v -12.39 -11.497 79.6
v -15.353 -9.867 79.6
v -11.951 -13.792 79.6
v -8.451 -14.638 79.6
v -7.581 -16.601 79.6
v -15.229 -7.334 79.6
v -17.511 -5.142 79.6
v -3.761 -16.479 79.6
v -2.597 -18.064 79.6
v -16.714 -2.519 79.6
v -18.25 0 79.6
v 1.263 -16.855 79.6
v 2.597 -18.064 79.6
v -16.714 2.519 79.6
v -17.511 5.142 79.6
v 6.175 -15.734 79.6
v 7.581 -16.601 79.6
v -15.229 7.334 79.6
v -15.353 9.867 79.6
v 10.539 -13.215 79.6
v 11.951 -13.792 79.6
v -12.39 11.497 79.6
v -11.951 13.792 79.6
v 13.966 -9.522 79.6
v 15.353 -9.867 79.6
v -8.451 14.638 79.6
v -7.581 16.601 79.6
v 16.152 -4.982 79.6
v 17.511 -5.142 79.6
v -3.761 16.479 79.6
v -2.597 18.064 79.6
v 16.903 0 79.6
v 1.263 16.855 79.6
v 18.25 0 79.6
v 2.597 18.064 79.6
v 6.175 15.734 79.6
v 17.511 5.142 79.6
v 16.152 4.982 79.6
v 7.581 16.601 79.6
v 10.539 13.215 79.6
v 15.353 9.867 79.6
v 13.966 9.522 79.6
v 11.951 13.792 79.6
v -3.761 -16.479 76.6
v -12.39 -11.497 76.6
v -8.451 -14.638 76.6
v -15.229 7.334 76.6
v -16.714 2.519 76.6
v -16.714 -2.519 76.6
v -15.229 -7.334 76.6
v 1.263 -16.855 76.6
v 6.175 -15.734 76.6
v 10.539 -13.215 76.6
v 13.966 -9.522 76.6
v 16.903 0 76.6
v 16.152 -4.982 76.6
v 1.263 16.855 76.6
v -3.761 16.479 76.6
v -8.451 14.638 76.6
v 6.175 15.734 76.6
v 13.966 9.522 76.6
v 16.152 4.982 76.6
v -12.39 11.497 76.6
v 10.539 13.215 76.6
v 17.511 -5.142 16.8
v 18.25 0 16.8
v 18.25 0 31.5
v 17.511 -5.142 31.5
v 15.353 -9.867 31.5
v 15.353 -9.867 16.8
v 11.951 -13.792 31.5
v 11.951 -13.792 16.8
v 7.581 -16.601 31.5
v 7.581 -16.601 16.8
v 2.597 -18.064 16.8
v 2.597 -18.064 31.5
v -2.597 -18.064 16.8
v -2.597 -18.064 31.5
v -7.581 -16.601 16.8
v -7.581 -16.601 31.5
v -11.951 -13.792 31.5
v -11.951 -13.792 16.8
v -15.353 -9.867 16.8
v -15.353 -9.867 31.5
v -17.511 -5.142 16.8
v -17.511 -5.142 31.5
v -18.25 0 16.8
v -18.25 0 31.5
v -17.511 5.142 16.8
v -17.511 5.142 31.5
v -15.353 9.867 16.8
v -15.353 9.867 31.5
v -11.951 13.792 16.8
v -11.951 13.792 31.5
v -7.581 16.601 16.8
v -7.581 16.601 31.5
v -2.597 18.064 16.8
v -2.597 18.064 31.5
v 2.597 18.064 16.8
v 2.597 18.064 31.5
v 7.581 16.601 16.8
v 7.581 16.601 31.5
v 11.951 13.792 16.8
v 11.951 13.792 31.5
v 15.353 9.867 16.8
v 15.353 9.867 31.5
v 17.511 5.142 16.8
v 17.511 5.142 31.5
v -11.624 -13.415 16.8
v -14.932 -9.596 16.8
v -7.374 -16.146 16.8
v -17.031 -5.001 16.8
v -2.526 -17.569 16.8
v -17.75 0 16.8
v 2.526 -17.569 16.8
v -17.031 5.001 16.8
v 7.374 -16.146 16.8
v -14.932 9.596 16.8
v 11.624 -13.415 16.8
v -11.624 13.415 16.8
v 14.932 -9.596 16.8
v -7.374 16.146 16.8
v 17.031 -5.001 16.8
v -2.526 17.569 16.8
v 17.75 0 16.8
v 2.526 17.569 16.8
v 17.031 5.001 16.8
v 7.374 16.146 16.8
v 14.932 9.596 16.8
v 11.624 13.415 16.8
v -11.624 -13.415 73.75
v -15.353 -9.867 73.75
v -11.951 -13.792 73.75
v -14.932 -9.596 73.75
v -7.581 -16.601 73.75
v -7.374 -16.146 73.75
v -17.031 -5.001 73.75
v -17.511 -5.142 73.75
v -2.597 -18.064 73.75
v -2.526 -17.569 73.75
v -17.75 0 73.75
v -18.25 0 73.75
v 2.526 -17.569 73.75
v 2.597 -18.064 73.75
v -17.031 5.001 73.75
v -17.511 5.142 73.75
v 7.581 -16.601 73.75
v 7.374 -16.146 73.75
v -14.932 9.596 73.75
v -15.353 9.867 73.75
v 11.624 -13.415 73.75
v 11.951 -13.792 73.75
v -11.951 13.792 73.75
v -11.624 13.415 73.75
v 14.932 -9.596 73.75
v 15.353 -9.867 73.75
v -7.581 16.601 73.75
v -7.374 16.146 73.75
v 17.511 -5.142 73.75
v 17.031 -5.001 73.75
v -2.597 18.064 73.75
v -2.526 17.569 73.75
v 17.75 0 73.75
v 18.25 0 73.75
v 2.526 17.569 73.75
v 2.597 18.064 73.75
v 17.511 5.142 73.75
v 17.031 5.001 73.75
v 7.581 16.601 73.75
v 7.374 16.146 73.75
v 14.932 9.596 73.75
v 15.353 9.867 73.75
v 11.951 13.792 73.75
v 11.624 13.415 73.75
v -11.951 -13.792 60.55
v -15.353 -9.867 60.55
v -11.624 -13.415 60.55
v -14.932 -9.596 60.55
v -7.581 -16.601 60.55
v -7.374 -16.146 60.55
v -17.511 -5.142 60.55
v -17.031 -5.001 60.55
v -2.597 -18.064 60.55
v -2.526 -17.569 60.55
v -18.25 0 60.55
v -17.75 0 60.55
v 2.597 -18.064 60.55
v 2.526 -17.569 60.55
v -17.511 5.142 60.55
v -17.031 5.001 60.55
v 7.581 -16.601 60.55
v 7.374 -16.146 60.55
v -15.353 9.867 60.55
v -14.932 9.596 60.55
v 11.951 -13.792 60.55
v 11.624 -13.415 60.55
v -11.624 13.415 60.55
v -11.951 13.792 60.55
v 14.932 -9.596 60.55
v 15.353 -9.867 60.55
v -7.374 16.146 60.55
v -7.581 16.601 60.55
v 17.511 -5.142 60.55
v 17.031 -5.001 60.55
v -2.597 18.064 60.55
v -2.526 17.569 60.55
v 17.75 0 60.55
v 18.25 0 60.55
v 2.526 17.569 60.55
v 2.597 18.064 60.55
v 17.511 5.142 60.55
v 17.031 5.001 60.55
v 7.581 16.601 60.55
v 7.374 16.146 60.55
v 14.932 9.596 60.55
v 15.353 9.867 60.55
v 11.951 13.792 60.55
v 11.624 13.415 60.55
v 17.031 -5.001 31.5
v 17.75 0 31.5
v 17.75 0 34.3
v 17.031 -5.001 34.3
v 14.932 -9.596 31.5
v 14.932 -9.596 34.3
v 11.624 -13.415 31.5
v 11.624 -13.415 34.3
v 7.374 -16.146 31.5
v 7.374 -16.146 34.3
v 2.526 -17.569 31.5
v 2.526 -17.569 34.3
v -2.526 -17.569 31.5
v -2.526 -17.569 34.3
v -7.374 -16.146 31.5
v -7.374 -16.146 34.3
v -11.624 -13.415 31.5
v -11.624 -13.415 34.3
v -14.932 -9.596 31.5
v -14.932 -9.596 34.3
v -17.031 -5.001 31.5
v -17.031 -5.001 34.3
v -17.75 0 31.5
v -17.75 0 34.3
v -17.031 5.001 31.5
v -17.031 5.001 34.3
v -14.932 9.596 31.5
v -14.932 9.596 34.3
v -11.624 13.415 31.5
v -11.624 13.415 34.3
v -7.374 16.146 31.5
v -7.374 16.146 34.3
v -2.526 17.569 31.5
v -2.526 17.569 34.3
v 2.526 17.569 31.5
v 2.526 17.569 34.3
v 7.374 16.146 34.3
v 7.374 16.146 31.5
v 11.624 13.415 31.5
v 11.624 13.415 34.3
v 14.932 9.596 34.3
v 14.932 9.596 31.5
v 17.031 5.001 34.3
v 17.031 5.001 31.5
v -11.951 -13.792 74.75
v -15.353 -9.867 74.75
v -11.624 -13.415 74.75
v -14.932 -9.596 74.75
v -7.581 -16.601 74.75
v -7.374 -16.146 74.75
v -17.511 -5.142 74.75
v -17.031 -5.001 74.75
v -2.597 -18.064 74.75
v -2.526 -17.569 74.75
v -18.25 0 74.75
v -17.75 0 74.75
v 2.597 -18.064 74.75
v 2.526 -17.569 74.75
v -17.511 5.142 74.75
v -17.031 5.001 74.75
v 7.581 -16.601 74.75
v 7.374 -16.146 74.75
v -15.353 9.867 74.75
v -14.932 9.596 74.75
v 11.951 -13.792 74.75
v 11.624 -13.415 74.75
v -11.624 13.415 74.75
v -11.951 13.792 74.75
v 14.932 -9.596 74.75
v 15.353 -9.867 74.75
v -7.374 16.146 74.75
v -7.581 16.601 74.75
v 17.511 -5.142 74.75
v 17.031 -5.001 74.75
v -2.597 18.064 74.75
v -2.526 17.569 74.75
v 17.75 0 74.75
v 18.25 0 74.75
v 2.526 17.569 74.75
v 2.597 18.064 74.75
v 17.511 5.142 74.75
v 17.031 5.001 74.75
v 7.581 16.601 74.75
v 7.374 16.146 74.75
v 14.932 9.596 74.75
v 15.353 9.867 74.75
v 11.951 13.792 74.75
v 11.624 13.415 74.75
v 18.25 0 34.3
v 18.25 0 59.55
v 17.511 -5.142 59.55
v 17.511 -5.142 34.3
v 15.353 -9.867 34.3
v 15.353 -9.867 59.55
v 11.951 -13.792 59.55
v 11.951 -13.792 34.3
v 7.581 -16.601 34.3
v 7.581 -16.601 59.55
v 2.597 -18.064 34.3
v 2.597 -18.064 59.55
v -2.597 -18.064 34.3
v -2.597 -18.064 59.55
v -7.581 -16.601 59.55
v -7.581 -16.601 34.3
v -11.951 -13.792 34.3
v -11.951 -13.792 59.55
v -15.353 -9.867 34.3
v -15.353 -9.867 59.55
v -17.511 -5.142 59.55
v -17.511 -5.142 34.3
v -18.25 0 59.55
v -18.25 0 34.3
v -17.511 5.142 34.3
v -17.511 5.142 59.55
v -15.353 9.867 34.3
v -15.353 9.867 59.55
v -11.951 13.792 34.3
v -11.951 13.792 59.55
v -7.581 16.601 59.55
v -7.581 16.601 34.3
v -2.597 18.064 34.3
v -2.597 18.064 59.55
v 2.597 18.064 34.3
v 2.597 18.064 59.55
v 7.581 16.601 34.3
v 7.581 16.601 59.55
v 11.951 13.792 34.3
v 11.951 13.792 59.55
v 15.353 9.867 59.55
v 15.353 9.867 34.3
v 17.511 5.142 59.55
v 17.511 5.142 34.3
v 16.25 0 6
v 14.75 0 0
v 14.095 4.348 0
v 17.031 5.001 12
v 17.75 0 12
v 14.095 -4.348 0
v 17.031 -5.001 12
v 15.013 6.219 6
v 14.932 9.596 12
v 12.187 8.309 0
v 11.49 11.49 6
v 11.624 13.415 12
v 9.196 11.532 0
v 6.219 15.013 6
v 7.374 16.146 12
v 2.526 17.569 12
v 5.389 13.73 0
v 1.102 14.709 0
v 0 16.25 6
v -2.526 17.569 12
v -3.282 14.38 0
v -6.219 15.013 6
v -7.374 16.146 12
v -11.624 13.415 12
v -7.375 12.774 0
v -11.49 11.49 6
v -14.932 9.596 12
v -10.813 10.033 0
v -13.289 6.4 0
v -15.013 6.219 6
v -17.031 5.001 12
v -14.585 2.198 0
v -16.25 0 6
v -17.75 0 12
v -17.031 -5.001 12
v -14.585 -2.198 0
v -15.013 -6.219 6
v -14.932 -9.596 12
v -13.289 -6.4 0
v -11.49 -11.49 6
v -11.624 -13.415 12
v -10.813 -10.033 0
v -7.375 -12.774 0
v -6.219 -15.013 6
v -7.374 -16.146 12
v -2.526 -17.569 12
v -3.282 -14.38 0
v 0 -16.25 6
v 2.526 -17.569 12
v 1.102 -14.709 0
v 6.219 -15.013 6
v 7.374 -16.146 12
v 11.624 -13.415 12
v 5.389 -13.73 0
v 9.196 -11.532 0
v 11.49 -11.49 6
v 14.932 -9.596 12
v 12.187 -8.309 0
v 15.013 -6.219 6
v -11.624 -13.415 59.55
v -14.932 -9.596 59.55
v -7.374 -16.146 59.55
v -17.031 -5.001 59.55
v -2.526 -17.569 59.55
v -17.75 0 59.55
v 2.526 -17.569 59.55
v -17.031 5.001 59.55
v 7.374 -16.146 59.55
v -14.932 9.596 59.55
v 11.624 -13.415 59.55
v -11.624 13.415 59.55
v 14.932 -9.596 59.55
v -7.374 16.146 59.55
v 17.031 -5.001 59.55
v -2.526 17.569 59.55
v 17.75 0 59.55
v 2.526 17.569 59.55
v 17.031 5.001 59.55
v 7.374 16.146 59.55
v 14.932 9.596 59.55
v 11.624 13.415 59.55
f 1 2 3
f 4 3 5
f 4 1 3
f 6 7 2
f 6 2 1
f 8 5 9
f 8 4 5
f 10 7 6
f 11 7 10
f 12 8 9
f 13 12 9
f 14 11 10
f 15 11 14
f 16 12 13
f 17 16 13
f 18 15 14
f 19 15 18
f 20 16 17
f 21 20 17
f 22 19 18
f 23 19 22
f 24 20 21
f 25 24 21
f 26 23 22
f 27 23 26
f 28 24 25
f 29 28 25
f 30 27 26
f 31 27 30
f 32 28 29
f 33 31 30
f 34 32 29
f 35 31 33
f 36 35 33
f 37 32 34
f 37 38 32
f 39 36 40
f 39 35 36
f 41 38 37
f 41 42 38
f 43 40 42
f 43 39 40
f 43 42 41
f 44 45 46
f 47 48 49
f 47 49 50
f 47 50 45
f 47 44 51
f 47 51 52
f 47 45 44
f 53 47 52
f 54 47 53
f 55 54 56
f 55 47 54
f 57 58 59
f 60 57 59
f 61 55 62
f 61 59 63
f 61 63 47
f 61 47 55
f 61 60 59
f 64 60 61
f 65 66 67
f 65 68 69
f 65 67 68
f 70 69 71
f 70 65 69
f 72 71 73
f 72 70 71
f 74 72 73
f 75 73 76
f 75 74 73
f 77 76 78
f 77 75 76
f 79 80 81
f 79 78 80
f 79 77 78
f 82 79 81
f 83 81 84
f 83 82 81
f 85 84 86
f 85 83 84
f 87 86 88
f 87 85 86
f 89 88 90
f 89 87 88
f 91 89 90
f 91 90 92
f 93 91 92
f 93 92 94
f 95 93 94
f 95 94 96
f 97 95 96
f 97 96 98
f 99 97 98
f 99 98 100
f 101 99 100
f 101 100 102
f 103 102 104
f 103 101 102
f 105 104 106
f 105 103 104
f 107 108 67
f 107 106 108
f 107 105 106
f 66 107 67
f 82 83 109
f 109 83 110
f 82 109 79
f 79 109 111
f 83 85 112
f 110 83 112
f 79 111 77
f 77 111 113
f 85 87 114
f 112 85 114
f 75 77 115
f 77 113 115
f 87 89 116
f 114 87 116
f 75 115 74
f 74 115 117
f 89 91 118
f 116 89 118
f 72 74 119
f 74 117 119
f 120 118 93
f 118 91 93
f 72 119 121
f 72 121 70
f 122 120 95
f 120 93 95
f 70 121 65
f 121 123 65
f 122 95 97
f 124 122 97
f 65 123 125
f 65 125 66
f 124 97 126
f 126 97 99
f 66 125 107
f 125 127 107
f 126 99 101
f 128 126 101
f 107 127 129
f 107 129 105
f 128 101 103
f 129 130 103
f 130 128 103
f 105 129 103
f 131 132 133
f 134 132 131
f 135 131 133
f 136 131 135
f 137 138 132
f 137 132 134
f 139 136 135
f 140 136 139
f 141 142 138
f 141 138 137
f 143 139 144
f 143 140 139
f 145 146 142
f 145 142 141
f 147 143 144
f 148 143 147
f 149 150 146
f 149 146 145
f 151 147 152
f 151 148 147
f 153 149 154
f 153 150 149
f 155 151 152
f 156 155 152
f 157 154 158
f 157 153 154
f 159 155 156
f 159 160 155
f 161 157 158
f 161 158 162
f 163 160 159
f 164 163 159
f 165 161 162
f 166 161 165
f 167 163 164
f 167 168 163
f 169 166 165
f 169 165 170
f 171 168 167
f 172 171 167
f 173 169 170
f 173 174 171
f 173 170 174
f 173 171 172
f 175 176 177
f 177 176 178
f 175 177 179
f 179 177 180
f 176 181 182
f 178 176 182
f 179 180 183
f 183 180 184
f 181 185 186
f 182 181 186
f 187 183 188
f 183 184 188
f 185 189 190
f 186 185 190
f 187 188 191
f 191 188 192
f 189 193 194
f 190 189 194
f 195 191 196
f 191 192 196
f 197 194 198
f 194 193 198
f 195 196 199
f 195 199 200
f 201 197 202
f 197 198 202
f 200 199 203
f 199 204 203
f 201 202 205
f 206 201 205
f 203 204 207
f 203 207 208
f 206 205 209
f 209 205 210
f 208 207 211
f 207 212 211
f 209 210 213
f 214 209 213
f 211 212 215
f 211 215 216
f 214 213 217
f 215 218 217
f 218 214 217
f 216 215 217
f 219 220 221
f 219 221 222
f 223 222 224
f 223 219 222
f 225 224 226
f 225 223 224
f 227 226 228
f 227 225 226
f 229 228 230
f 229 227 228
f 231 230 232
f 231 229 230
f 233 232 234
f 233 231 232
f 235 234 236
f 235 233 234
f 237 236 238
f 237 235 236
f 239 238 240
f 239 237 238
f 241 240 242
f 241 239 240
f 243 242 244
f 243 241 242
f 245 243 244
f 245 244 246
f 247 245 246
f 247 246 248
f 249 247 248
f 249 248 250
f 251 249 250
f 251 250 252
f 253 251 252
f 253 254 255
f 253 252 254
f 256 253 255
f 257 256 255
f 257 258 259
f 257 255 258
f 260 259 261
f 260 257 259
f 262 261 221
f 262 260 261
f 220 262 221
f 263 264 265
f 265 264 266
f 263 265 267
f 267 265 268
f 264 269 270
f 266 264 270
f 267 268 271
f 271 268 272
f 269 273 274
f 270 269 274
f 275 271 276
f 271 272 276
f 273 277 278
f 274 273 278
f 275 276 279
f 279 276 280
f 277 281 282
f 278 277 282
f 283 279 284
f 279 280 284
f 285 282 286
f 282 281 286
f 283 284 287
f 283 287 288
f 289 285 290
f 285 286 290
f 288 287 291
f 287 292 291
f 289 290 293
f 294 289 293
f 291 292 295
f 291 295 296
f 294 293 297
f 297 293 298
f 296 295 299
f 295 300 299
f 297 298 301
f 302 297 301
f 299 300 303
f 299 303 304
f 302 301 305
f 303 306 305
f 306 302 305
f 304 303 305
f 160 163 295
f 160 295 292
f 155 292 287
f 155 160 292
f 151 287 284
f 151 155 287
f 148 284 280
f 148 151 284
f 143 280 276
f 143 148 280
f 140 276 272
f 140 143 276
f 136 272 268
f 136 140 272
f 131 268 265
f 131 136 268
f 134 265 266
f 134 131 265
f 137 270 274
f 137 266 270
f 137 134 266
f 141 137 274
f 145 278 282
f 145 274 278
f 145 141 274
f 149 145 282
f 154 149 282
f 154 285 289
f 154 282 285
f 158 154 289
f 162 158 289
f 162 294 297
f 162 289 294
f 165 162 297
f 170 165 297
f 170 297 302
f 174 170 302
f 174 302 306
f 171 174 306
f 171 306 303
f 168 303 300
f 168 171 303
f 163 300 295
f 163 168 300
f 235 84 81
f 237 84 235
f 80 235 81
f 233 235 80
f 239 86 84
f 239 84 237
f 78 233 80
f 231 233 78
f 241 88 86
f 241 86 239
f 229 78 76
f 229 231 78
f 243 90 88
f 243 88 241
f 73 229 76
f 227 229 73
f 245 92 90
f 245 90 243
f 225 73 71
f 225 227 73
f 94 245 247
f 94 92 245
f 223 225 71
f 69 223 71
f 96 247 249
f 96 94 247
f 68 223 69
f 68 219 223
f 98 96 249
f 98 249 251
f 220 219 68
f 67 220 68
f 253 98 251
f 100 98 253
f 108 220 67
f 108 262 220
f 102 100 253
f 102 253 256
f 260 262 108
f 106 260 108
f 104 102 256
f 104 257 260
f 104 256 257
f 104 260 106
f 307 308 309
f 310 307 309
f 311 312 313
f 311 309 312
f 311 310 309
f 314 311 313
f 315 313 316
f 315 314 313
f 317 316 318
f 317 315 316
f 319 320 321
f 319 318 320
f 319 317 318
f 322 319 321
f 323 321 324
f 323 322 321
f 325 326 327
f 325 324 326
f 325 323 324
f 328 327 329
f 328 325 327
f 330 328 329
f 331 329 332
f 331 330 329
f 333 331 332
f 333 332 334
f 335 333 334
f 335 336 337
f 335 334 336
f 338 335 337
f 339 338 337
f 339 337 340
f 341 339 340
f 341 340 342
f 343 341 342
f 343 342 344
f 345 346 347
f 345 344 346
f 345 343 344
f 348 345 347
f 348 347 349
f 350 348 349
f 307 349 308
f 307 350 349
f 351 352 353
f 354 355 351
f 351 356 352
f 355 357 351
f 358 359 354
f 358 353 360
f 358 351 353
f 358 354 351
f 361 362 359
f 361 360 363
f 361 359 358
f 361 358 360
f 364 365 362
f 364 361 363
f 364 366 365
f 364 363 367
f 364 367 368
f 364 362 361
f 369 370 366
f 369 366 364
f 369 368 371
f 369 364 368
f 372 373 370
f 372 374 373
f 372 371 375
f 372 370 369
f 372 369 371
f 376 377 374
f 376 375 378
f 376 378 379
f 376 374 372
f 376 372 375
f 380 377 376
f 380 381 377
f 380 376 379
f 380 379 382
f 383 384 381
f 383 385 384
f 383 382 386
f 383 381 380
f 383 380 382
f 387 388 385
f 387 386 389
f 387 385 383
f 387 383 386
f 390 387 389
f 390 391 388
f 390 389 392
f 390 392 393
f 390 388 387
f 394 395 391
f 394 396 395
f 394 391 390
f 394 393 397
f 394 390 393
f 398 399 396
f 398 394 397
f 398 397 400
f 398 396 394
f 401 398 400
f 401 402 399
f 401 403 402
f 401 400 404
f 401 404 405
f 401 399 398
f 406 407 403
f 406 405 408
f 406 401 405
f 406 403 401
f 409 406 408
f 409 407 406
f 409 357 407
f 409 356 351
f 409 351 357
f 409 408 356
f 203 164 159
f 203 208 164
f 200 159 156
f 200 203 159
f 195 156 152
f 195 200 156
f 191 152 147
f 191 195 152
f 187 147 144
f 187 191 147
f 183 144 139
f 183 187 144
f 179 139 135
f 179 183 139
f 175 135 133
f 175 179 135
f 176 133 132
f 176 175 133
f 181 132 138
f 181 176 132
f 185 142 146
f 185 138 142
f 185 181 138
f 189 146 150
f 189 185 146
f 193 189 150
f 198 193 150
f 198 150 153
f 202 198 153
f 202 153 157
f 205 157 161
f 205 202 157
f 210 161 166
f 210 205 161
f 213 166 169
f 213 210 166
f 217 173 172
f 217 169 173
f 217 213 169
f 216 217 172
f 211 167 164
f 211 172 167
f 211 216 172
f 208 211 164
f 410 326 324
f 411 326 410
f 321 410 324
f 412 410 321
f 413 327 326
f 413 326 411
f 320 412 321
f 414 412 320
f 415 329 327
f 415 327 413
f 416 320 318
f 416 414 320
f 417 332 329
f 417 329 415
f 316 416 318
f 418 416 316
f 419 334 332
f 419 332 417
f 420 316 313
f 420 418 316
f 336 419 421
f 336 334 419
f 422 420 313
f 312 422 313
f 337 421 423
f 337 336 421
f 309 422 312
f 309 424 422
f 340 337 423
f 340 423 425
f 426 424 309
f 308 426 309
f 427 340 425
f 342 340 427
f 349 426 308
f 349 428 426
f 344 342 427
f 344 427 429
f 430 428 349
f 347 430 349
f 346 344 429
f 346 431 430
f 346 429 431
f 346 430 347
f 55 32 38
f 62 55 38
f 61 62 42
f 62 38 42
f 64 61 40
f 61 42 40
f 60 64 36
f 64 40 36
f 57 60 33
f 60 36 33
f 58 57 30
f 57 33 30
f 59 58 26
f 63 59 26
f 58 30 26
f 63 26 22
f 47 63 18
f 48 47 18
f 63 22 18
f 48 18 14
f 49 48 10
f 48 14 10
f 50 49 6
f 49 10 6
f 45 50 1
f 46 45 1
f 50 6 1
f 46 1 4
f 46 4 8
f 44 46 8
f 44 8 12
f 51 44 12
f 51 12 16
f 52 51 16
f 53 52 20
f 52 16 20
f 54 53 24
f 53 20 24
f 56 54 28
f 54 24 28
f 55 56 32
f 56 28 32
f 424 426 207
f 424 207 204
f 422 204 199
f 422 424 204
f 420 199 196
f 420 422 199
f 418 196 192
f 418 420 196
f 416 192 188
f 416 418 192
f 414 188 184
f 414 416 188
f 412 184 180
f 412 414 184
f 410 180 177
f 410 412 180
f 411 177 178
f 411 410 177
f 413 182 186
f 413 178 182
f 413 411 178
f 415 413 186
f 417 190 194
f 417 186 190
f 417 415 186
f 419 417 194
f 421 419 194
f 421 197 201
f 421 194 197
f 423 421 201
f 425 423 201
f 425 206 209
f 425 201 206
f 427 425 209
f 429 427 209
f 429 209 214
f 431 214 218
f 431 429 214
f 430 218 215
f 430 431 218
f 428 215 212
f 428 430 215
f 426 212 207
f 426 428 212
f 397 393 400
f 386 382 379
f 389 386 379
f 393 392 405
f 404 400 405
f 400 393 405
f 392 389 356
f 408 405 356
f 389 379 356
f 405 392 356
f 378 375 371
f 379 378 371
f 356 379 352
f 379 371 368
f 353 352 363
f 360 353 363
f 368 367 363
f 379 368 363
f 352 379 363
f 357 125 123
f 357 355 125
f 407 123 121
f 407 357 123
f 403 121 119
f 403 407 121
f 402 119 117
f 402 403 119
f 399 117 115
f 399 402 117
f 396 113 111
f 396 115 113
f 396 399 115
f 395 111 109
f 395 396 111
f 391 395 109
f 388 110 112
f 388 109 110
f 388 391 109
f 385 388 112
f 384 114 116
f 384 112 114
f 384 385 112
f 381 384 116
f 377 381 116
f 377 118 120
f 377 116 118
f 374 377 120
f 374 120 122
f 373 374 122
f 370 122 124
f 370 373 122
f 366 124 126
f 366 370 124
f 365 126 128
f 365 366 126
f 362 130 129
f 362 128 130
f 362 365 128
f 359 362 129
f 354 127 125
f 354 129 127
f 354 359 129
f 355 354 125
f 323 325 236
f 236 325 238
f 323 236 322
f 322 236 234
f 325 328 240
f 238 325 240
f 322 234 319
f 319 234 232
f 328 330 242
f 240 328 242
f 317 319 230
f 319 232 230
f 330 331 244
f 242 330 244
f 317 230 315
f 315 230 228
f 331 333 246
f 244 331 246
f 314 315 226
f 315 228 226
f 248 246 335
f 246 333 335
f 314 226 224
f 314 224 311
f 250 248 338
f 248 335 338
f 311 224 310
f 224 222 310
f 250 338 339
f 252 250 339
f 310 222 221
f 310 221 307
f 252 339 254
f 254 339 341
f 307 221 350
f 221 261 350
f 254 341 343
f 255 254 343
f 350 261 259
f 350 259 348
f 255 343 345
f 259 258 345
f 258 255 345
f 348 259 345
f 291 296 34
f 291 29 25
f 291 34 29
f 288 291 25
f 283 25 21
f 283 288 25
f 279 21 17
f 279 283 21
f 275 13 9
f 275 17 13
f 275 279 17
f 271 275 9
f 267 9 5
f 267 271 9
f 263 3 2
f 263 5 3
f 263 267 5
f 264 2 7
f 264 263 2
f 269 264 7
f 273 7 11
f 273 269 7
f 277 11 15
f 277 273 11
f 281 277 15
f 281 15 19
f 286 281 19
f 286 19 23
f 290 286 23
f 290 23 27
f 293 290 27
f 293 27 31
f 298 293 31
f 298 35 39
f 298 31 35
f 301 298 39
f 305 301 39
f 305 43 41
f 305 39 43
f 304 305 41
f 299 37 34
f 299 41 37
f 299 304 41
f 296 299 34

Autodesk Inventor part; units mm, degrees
ref_plane "YZ Plane" through (0, 0, 0) normal (1, 0, 0) x (0, 1, 0)
ref_plane "XZ Plane" through (0, 0, 0) normal (0, 1, 0) x (-1, 0, 0)
ref_plane "XY Plane" through (0, 0, 0) normal (0, 0, 1) x (1, 0, 0)
sketch "Sketch1" plane through (0, 0, 0) normal (0, 0, 1) x (1, 0, 0)
  circle A0 centre (0, 0) radius 17.75
  dimension "d0" = 35.5
extrude "Extrusion1" add sketch "Sketch1" along normal blind 16.8
sketch "Sketch2" plane through (0, 0, 16.8) normal (0, 0, 1) x (1, 0, 0)
  circle A0 centre (0, 0) radius 17.75 projected
  circle A1 centre (0, 0) radius 18.25
  dimension "d3" = 36.5
extrude "Extrusion2" add sketch "Sketch2" along normal blind 14.7 contours A0 | A1
chamfer "Chamfer1" distance 3 distance2 12 1 edges at (-17.75, 0, 0) measured on face at (-0.7132, -5.1908, 0)
sketch "Sketch3" plane through (0, 0, 31.5) normal (0, 0, 1) x (1, 0, 0)
  circle A0 centre (0, 0) radius 18.25 projected
  circle A1 centre (0, 0) radius 17.75
  dimension "d9" = 35.5
extrude "Extrusion3" add sketch "Sketch3" along normal blind 2.8 contours A1
sketch "Sketch4" plane through (0, 0, 34.3) normal (0, 0, 1) x (1, 0, 0)
  circle A0 centre (0, 0) radius 17.75 projected
  circle A1 centre (0, 0) radius 18.25
  dimension "d12" = 36.5
extrude "Extrusion4" add sketch "Sketch4" along normal blind 25.25 contours A0 | A1
sketch "Sketch5" plane through (0, 0, 59.55) normal (0, 0, 1) x (1, 0, 0)
  circle A0 centre (0, 0) radius 18.25 projected
  circle A1 centre (0, 0) radius 17.75
  dimension "d15" = 35.5
extrude "Extrusion5" add sketch "Sketch5" along normal blind 1 contours A1
sketch "Sketch6" plane through (0, 0, 60.55) normal (0, 0, 1) x (1, 0, 0)
  circle A0 centre (0, 0) radius 17.75 projected
  circle A1 centre (0, 0) radius 18.25
  dimension "d18" = 36.5
extrude "Extrusion6" add sketch "Sketch6" along normal blind 13.2 contours A0 | A1
sketch "Sketch7" plane through (0, 0, 73.75) normal (0, 0, 1) x (1, 0, 0)
  circle A0 centre (0, 0) radius 18.25 projected
  circle A1 centre (0, 0) radius 17.75
  dimension "d21" = 35.5
extrude "Extrusion7" add sketch "Sketch7" along normal blind 1 contours A1
sketch "Sketch8" plane through (0, 0, 74.75) normal (0, 0, 1) x (1, 0, 0)
  circle A0 centre (0, 0) radius 17.75 projected
  circle A1 centre (0, 0) radius 18.25
  dimension "d24" = 36.5
extrude "Extrusion8" add sketch "Sketch8" along normal blind 4.85 contours A0 | A1
sketch "Sketch9" plane through (0, 0, 79.6) normal (0, 0, 1) x (1, 0, 0)
  circle A0 centre (0, 0) radius 16.9026
extrude "Extrusion9" cut sketch "Sketch9" against normal blind 3
properties part number "MLM3X-MP" material "Acetal Resin, Black"
